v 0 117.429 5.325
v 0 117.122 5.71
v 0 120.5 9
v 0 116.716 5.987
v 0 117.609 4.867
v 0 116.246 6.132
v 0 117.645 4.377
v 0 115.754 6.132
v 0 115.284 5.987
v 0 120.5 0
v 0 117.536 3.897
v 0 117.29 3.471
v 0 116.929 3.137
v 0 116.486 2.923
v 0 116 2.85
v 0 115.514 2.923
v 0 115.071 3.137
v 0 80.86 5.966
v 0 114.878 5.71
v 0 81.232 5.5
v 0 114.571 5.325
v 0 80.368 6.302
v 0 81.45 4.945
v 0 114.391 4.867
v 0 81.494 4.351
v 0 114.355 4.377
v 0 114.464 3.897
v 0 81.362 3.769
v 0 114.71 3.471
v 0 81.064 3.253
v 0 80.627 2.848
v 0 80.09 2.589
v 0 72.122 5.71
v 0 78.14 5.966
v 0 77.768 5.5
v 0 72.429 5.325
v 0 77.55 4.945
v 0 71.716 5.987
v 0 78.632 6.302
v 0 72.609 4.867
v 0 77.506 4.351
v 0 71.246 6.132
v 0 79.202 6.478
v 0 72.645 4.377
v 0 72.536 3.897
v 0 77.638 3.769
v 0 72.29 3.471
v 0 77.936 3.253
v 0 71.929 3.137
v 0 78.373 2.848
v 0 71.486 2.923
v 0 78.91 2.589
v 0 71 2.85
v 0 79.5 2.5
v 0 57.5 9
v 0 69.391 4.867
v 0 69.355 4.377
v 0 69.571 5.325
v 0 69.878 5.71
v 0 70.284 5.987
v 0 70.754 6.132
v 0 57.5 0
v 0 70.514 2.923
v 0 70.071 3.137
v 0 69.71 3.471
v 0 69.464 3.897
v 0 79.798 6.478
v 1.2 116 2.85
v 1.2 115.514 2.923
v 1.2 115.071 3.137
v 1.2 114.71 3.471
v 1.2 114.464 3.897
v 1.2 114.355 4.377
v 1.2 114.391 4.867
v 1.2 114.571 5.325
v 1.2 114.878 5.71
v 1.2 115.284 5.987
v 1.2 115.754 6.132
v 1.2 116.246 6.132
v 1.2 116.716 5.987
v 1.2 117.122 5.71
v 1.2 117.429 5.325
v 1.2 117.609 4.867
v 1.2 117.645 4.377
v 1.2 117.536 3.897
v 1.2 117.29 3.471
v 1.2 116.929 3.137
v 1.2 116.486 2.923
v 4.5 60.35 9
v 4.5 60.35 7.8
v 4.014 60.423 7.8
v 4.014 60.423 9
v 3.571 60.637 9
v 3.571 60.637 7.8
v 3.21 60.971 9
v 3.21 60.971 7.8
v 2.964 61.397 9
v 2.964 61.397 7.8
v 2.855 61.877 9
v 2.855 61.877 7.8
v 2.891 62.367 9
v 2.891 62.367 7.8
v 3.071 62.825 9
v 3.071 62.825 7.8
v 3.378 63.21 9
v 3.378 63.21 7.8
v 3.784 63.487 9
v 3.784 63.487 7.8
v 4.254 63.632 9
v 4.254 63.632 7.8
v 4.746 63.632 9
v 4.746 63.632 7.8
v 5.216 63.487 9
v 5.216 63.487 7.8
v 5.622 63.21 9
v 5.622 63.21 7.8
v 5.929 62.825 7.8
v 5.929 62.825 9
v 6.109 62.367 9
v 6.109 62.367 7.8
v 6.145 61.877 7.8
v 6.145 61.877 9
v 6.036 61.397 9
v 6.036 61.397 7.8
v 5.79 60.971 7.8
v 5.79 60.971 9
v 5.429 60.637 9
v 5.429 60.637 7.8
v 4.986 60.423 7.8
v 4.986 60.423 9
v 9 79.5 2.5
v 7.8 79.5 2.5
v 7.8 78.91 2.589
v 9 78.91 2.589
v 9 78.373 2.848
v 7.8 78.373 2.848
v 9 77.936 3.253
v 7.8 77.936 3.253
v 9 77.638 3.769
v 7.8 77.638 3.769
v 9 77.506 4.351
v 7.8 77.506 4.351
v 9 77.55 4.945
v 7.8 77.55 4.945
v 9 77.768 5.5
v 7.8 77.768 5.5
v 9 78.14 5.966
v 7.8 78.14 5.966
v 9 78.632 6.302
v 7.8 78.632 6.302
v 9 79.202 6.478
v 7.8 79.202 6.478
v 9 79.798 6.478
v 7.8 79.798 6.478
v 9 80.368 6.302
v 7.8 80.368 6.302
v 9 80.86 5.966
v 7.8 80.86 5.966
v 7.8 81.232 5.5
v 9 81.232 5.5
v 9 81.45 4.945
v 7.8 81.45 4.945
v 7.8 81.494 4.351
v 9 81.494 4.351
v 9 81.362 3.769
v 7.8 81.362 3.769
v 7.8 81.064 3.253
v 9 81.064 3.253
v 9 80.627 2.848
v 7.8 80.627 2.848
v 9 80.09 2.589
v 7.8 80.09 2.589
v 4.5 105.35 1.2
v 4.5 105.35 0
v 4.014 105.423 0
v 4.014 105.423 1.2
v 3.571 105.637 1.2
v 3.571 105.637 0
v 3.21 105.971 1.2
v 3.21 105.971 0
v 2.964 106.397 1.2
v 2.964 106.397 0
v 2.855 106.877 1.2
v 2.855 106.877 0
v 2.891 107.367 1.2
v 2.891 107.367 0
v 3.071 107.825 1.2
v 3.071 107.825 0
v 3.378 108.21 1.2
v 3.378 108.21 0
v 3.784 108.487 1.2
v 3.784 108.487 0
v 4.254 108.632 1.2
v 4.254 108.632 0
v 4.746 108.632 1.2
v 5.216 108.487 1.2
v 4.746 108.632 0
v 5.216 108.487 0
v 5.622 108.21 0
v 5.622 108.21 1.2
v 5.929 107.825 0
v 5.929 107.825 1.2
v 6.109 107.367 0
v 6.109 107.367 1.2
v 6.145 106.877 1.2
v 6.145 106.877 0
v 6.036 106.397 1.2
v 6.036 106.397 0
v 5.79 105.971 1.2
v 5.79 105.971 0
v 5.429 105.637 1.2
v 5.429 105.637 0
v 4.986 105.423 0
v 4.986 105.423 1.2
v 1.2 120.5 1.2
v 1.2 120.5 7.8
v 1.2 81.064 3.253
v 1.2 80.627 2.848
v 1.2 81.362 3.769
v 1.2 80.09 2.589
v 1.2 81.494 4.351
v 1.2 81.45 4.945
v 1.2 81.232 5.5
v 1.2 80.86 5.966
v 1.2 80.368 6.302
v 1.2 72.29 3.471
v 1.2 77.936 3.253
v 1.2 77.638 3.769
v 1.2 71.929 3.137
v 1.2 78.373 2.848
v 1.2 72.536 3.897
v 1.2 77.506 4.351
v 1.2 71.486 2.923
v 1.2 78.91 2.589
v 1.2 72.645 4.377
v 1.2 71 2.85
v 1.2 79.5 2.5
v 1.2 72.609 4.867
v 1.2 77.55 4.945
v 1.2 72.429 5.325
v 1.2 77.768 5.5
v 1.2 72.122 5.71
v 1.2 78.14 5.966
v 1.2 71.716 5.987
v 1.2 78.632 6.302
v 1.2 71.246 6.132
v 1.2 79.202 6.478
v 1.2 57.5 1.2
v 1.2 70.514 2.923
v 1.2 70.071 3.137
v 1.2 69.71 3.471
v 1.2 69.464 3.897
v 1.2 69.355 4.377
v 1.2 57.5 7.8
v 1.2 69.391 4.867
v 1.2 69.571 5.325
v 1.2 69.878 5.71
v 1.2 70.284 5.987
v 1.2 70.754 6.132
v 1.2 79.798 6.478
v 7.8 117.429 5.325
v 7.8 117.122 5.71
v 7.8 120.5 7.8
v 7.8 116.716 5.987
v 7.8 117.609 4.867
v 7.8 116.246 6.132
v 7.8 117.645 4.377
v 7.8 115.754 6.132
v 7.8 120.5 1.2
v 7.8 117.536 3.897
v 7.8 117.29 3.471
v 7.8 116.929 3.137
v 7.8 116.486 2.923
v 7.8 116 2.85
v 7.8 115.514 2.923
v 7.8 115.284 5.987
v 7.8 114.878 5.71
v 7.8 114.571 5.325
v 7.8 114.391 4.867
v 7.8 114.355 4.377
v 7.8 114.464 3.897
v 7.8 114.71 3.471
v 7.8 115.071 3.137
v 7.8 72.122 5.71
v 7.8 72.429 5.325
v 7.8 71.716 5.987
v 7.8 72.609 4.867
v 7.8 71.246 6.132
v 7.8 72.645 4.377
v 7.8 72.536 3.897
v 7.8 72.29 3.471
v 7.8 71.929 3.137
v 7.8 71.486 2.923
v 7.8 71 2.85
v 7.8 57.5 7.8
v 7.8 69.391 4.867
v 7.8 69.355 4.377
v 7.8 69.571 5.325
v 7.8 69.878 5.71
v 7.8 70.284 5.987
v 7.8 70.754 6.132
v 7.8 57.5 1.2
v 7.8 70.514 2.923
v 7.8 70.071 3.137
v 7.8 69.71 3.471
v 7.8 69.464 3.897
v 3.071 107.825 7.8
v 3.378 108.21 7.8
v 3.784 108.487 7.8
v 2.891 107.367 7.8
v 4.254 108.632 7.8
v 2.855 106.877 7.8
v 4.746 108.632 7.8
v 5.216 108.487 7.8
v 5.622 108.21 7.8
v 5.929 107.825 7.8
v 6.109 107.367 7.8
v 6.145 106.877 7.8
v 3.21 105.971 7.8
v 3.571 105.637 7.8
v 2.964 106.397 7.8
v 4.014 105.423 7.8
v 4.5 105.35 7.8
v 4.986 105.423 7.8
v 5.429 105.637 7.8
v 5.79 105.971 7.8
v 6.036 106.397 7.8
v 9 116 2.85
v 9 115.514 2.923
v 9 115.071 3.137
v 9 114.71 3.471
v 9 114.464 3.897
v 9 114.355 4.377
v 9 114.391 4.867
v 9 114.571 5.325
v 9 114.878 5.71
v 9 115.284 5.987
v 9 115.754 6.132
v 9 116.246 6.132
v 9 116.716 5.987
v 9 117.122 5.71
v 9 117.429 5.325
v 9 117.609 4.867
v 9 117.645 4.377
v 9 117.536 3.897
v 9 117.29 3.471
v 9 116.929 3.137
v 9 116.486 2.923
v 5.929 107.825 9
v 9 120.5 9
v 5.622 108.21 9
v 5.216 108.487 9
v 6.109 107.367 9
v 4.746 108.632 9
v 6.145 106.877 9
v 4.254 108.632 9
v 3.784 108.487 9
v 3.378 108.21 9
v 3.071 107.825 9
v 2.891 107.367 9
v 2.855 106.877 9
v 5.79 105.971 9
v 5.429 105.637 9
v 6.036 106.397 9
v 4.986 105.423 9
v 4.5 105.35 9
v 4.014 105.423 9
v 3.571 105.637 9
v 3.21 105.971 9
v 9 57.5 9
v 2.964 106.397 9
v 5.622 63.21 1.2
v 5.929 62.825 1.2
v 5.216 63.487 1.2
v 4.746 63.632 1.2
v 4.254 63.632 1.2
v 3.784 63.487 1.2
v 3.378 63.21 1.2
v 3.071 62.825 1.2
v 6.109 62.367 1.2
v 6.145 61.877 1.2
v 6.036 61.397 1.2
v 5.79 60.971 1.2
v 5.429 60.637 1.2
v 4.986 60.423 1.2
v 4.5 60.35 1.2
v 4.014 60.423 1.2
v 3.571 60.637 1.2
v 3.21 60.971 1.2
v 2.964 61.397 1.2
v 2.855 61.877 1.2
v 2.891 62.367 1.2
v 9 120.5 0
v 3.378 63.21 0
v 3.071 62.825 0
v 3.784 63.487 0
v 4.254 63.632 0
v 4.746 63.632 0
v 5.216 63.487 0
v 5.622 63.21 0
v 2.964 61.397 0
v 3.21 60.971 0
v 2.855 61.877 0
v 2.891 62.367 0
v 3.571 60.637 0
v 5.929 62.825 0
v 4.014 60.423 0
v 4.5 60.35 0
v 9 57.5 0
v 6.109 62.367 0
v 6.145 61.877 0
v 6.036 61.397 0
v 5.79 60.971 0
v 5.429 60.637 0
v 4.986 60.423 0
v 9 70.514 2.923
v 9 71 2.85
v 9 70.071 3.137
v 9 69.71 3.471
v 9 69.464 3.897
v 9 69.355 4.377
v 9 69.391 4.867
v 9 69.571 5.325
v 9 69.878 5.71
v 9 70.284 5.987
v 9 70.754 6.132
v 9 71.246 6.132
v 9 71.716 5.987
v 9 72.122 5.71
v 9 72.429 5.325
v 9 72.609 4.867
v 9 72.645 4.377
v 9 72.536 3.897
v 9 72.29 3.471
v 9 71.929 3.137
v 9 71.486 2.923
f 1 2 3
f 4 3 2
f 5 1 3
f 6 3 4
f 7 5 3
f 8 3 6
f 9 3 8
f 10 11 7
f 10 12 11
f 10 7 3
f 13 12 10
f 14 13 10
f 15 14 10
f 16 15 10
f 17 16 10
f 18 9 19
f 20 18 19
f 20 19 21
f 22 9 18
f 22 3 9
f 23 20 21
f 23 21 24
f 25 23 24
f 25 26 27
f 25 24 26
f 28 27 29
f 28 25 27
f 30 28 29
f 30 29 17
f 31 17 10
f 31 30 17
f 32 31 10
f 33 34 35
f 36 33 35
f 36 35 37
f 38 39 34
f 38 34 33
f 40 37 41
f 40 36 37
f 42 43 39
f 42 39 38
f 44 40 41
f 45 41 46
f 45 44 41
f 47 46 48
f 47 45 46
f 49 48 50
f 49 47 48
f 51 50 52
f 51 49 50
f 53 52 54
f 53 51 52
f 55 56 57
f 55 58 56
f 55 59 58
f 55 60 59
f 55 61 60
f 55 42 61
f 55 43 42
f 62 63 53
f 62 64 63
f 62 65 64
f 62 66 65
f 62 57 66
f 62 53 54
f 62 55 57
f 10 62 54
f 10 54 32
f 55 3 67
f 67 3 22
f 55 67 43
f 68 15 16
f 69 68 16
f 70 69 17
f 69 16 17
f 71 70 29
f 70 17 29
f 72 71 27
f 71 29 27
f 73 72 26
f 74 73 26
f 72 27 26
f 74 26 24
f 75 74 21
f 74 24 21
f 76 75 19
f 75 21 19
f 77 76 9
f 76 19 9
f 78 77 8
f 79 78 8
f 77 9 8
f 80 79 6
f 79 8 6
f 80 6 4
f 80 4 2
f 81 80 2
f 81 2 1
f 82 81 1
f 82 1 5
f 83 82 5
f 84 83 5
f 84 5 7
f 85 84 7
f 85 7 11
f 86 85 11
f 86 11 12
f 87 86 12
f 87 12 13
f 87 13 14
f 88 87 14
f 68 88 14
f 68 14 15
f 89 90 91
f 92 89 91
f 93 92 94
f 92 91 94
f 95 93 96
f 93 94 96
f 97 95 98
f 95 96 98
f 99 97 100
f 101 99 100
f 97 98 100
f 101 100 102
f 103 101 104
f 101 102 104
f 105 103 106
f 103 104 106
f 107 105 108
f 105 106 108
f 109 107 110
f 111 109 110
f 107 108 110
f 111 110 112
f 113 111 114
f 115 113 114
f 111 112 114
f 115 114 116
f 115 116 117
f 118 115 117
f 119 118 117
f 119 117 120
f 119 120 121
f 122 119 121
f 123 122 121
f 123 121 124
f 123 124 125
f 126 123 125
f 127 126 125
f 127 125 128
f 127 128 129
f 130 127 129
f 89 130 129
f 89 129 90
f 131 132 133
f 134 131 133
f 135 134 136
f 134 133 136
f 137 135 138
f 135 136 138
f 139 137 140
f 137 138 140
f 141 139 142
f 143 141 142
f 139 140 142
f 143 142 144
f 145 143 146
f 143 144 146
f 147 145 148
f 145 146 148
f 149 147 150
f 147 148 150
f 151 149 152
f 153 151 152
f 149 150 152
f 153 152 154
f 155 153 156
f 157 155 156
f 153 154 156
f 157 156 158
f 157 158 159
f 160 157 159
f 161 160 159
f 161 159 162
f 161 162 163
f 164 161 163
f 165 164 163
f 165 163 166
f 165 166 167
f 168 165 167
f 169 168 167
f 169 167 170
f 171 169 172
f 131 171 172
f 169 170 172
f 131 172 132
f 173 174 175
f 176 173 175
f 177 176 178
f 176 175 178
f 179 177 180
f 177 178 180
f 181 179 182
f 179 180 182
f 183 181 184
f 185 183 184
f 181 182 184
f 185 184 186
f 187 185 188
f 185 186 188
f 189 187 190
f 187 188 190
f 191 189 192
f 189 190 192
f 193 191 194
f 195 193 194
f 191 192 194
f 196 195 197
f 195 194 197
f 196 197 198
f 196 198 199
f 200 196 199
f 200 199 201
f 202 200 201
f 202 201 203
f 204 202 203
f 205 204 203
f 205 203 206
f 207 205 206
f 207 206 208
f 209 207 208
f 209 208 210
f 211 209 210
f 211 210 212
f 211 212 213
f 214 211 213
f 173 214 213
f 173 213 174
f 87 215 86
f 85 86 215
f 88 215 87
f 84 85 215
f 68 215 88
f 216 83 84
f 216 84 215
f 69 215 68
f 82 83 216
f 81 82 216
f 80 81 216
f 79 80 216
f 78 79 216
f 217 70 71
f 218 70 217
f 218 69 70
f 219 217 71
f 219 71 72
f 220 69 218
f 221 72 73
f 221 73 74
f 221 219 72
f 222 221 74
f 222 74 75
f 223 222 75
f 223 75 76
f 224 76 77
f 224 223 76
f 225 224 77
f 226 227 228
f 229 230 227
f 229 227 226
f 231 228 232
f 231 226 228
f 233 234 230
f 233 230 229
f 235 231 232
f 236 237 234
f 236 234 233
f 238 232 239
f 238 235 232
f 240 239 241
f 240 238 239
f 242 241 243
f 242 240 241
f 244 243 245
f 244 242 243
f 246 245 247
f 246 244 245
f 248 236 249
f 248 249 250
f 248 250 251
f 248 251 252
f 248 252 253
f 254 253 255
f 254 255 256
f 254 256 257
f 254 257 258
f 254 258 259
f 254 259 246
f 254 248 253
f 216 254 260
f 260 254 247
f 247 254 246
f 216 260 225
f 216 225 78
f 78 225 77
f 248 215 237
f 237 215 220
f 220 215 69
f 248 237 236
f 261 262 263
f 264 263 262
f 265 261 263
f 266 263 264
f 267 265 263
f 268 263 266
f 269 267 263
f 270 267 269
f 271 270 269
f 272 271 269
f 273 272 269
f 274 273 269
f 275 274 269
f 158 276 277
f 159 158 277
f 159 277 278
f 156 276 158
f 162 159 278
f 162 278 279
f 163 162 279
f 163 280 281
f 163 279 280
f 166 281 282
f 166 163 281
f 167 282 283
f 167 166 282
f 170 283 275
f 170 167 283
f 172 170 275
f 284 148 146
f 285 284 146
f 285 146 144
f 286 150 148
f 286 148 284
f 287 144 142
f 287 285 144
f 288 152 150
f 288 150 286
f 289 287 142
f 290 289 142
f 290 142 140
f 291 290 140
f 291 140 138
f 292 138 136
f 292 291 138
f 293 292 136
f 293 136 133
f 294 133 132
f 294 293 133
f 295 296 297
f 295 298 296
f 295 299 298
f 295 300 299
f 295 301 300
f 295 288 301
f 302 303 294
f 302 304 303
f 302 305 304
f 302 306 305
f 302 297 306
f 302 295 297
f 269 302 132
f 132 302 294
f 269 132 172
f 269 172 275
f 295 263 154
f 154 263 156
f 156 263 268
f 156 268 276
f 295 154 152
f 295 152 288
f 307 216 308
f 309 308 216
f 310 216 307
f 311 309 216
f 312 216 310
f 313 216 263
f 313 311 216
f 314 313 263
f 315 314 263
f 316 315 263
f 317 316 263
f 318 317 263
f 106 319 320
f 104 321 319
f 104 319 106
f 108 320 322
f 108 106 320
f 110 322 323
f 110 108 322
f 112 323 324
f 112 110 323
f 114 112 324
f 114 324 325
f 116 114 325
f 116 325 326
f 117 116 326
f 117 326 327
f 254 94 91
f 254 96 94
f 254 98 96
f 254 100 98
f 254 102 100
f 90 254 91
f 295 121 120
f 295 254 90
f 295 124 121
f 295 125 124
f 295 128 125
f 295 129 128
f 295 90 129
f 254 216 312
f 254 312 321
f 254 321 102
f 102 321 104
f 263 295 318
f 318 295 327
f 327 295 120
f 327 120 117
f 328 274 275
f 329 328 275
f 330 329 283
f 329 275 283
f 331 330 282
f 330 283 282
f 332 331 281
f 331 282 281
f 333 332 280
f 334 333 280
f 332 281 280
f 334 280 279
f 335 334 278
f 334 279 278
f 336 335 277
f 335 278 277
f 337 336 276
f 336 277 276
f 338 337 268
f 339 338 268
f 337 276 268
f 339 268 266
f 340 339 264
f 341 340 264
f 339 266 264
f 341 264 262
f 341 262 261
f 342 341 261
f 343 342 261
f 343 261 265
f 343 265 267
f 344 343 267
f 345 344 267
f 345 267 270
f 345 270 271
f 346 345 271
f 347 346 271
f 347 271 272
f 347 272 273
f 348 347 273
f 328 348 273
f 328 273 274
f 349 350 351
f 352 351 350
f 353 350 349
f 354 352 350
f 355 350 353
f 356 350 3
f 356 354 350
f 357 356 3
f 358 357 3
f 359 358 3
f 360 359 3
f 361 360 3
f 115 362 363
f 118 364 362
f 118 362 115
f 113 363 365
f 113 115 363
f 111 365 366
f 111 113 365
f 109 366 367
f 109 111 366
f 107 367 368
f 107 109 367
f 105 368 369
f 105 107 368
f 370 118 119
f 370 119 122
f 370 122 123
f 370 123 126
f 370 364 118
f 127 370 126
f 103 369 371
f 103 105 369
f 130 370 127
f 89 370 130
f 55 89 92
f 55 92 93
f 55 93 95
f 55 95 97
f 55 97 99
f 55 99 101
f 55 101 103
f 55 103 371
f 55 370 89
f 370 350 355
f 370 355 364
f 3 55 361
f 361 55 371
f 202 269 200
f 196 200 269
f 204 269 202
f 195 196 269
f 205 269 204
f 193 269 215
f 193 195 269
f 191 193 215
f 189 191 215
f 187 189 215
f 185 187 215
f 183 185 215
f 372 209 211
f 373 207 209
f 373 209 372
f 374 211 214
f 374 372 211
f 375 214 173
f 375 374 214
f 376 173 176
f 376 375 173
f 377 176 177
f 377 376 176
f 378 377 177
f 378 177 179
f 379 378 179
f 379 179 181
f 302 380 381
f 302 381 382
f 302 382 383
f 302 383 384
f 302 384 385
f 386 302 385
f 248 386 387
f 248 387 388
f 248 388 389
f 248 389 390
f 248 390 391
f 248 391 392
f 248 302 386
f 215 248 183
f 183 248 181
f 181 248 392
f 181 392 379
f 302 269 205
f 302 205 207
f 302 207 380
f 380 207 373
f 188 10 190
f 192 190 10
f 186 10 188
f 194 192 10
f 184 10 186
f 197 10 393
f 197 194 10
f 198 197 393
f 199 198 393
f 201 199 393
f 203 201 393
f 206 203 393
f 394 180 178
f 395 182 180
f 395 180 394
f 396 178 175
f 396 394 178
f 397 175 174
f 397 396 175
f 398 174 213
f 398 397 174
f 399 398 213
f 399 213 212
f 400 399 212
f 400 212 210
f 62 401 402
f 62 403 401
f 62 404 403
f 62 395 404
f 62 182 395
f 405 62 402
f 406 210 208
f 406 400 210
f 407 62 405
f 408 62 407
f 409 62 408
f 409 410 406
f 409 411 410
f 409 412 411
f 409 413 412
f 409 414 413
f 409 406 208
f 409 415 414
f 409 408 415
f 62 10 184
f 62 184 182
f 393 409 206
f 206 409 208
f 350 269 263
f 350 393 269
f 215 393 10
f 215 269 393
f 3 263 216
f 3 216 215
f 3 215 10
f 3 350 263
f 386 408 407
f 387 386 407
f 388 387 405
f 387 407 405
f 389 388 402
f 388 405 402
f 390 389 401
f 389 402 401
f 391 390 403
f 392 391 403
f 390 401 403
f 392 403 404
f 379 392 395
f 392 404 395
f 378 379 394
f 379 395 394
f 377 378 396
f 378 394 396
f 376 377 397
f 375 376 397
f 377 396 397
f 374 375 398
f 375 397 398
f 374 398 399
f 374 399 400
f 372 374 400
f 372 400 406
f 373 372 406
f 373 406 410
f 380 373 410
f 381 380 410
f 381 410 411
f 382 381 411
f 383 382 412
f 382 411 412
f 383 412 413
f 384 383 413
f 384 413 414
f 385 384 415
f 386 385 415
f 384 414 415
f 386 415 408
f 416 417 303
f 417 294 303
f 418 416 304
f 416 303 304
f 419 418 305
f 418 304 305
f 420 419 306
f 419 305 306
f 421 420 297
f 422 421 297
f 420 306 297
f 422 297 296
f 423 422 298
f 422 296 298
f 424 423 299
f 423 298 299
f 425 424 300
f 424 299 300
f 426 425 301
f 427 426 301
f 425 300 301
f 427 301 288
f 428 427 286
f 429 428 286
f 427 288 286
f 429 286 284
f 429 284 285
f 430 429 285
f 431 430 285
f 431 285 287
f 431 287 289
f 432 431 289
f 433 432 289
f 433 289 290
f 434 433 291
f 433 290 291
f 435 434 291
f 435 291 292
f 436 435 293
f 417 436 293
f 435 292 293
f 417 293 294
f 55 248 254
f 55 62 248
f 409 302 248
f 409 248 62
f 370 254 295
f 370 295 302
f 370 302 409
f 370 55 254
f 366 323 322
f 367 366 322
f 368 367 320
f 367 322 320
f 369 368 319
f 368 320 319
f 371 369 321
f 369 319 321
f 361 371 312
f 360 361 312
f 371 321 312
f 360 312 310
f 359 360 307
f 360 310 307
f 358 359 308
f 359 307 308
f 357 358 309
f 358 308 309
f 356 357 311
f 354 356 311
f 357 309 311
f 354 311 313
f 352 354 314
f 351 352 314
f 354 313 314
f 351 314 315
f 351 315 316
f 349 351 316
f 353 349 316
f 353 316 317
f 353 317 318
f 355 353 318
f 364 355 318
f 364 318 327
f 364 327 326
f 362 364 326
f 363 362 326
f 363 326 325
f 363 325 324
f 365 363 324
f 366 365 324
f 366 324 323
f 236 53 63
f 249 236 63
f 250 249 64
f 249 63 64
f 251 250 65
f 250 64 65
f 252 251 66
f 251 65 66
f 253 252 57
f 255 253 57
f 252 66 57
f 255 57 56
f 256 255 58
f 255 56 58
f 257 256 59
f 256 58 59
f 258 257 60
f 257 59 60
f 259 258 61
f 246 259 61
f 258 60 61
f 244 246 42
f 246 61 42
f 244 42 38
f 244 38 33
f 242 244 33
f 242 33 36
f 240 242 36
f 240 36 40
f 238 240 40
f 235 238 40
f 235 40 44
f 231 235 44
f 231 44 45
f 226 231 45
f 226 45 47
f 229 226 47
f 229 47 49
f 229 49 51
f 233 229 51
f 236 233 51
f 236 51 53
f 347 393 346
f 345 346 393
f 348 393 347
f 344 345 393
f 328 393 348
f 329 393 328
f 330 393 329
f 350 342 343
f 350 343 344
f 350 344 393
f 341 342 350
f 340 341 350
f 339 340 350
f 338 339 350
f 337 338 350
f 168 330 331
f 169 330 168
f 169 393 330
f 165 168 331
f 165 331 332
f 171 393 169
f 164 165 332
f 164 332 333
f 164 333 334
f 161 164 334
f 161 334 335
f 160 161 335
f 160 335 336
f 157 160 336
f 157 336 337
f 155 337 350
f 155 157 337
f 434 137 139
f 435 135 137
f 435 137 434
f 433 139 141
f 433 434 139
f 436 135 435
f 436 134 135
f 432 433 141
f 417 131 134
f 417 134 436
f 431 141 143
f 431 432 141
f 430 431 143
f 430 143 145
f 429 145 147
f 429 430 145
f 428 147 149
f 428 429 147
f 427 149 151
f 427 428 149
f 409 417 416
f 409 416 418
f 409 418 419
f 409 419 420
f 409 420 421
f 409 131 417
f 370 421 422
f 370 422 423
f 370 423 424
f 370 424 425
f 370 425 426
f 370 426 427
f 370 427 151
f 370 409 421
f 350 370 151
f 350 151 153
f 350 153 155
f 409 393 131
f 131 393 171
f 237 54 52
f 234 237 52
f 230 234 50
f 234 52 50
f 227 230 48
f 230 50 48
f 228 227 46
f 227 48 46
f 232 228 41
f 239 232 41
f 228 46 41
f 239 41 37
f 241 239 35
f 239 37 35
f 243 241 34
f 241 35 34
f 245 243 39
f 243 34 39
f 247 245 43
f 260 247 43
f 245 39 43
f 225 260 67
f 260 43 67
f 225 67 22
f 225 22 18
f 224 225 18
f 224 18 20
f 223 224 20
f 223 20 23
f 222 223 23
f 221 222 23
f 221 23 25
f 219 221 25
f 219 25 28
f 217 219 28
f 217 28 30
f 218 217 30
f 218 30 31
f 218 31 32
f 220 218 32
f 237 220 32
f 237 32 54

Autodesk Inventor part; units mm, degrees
ref_plane "YZ Plane" through (0, 0, 0) normal (1, 0, 0) x (0, 1, 0)
ref_plane "XZ Plane" through (0, 0, 0) normal (0, 1, 0) x (-1, 0, 0)
ref_plane "XY Plane" through (0, 0, 0) normal (0, 0, 1) x (1, 0, 0)
sketch "スケッチ1" plane through (0, 0, 0) normal (0, 1, 0) x (-1, 0, 0)
  line L0 (0, 0) -> (-9, 0)
  line L1 (-9, 0) -> (-9, 9)
  line L2 (-9, 9) -> (0, 9)
  line L3 (0, 9) -> (0, 0)
  line L4 (-1.2, 7.8) -> (-7.8, 7.8)
  line L5 (-7.8, 7.8) -> (-7.8, 1.2)
  line L6 (-7.8, 1.2) -> (-1.2, 1.2)
  line L7 (-1.2, 1.2) -> (-1.2, 7.8)
  dimension "d0" = 9
  dimension "d1" = 9
  dimension "d2" = 1.2
  dimension "d3" = 1.2
  dimension "d4" = 1.2
  dimension "d5" = 1.2
extrude "押し出し1" add sketch "スケッチ1" along normal blind 120.5
sketch "スケッチ3" plane through (9, 0, 9) normal (1, 0, 0) x (0, 0, -1)
  line L0 (0, 120.5) -> (9, 120.5) projected
  line L1 (9, 0) -> (9, 120.5) projected
  line L2 (0, 0) -> (9, 0) projected
  point P0 (4.5, 71)
  point P1 (4.5, 116)
  dimension "d20" = 4.5
  dimension "d38" = 71
  dimension "d39" = 45
hole "穴2" at (9, 71, 4.5) at (9, 116, 4.5) direction (-1, 0, 0) diameter 3.3 end through all
sketch "スケッチ4" plane through (0, 0, 9) normal (0, 0, 1) x (1, 0, 0)
  line L0 (0, 120.5) -> (9, 120.5) projected
  line L1 (9, 0) -> (9, 120.5) projected
  line L2 (0, 0) -> (9, 0) projected
  point P0 (4.5, 62)
  point P1 (4.5, 107)
  dimension "d29" = 4.5
  dimension "d37" = 62
  dimension "d40" = 45
hole "穴3" at (4.5, 62, 9) at (4.5, 107, 9) direction (0, 0, -1) diameter 3.3 end through all
sketch "スケッチ5" plane through (9, 0, 9) normal (1, 0, 0) x (0, 0, -1)
  line L0 (0, 0) -> (0, 120.5) projected
  circle A0 centre (4.5, 71) radius 1.65 projected
  point P0 (9, 0)
  point P1 (4.5, 79.5)
  dimension "d41" = 4.5
  dimension "d42" = 8.5
hole "穴4" at (9, 79.5, 4.5) direction (-1, 0, 0) diameter 4 end through all
sketch "スケッチ6" plane through (0, 0, 0) normal (0, -1, 0) x (1, 0, 0)
  line L0 (9, 0) -> (0, 0) projected
  line L1 (0, 9) -> (9, 9) projected
  line L2 (0, 0) -> (9, 0)
  line L3 (9, 0) -> (9, 9)
  line L4 (9, 9) -> (0, 9)
  line L5 (0, 9) -> (0, 0)
  line L6 (1.2, 1.2) -> (7.8, 1.2) projected
  line L7 (7.8, 1.2) -> (7.8, 7.8) projected
  line L8 (1.2, 1.2) -> (7.8, 1.2)
  line L9 (7.8, 1.2) -> (7.8, 7.8)
  line L10 (7.8, 7.8) -> (1.2, 7.8)
  line L11 (1.2, 7.8) -> (1.2, 1.2)
extrude "押し出し2" cut sketch "スケッチ6" against normal blind 57.5
equation "\"d3\" = d2"
equation "\"d4\" = d2"
equation "\"d5\" = d3"
properties part number "ハンド9x9_1" material "アルミニウム 6061"
